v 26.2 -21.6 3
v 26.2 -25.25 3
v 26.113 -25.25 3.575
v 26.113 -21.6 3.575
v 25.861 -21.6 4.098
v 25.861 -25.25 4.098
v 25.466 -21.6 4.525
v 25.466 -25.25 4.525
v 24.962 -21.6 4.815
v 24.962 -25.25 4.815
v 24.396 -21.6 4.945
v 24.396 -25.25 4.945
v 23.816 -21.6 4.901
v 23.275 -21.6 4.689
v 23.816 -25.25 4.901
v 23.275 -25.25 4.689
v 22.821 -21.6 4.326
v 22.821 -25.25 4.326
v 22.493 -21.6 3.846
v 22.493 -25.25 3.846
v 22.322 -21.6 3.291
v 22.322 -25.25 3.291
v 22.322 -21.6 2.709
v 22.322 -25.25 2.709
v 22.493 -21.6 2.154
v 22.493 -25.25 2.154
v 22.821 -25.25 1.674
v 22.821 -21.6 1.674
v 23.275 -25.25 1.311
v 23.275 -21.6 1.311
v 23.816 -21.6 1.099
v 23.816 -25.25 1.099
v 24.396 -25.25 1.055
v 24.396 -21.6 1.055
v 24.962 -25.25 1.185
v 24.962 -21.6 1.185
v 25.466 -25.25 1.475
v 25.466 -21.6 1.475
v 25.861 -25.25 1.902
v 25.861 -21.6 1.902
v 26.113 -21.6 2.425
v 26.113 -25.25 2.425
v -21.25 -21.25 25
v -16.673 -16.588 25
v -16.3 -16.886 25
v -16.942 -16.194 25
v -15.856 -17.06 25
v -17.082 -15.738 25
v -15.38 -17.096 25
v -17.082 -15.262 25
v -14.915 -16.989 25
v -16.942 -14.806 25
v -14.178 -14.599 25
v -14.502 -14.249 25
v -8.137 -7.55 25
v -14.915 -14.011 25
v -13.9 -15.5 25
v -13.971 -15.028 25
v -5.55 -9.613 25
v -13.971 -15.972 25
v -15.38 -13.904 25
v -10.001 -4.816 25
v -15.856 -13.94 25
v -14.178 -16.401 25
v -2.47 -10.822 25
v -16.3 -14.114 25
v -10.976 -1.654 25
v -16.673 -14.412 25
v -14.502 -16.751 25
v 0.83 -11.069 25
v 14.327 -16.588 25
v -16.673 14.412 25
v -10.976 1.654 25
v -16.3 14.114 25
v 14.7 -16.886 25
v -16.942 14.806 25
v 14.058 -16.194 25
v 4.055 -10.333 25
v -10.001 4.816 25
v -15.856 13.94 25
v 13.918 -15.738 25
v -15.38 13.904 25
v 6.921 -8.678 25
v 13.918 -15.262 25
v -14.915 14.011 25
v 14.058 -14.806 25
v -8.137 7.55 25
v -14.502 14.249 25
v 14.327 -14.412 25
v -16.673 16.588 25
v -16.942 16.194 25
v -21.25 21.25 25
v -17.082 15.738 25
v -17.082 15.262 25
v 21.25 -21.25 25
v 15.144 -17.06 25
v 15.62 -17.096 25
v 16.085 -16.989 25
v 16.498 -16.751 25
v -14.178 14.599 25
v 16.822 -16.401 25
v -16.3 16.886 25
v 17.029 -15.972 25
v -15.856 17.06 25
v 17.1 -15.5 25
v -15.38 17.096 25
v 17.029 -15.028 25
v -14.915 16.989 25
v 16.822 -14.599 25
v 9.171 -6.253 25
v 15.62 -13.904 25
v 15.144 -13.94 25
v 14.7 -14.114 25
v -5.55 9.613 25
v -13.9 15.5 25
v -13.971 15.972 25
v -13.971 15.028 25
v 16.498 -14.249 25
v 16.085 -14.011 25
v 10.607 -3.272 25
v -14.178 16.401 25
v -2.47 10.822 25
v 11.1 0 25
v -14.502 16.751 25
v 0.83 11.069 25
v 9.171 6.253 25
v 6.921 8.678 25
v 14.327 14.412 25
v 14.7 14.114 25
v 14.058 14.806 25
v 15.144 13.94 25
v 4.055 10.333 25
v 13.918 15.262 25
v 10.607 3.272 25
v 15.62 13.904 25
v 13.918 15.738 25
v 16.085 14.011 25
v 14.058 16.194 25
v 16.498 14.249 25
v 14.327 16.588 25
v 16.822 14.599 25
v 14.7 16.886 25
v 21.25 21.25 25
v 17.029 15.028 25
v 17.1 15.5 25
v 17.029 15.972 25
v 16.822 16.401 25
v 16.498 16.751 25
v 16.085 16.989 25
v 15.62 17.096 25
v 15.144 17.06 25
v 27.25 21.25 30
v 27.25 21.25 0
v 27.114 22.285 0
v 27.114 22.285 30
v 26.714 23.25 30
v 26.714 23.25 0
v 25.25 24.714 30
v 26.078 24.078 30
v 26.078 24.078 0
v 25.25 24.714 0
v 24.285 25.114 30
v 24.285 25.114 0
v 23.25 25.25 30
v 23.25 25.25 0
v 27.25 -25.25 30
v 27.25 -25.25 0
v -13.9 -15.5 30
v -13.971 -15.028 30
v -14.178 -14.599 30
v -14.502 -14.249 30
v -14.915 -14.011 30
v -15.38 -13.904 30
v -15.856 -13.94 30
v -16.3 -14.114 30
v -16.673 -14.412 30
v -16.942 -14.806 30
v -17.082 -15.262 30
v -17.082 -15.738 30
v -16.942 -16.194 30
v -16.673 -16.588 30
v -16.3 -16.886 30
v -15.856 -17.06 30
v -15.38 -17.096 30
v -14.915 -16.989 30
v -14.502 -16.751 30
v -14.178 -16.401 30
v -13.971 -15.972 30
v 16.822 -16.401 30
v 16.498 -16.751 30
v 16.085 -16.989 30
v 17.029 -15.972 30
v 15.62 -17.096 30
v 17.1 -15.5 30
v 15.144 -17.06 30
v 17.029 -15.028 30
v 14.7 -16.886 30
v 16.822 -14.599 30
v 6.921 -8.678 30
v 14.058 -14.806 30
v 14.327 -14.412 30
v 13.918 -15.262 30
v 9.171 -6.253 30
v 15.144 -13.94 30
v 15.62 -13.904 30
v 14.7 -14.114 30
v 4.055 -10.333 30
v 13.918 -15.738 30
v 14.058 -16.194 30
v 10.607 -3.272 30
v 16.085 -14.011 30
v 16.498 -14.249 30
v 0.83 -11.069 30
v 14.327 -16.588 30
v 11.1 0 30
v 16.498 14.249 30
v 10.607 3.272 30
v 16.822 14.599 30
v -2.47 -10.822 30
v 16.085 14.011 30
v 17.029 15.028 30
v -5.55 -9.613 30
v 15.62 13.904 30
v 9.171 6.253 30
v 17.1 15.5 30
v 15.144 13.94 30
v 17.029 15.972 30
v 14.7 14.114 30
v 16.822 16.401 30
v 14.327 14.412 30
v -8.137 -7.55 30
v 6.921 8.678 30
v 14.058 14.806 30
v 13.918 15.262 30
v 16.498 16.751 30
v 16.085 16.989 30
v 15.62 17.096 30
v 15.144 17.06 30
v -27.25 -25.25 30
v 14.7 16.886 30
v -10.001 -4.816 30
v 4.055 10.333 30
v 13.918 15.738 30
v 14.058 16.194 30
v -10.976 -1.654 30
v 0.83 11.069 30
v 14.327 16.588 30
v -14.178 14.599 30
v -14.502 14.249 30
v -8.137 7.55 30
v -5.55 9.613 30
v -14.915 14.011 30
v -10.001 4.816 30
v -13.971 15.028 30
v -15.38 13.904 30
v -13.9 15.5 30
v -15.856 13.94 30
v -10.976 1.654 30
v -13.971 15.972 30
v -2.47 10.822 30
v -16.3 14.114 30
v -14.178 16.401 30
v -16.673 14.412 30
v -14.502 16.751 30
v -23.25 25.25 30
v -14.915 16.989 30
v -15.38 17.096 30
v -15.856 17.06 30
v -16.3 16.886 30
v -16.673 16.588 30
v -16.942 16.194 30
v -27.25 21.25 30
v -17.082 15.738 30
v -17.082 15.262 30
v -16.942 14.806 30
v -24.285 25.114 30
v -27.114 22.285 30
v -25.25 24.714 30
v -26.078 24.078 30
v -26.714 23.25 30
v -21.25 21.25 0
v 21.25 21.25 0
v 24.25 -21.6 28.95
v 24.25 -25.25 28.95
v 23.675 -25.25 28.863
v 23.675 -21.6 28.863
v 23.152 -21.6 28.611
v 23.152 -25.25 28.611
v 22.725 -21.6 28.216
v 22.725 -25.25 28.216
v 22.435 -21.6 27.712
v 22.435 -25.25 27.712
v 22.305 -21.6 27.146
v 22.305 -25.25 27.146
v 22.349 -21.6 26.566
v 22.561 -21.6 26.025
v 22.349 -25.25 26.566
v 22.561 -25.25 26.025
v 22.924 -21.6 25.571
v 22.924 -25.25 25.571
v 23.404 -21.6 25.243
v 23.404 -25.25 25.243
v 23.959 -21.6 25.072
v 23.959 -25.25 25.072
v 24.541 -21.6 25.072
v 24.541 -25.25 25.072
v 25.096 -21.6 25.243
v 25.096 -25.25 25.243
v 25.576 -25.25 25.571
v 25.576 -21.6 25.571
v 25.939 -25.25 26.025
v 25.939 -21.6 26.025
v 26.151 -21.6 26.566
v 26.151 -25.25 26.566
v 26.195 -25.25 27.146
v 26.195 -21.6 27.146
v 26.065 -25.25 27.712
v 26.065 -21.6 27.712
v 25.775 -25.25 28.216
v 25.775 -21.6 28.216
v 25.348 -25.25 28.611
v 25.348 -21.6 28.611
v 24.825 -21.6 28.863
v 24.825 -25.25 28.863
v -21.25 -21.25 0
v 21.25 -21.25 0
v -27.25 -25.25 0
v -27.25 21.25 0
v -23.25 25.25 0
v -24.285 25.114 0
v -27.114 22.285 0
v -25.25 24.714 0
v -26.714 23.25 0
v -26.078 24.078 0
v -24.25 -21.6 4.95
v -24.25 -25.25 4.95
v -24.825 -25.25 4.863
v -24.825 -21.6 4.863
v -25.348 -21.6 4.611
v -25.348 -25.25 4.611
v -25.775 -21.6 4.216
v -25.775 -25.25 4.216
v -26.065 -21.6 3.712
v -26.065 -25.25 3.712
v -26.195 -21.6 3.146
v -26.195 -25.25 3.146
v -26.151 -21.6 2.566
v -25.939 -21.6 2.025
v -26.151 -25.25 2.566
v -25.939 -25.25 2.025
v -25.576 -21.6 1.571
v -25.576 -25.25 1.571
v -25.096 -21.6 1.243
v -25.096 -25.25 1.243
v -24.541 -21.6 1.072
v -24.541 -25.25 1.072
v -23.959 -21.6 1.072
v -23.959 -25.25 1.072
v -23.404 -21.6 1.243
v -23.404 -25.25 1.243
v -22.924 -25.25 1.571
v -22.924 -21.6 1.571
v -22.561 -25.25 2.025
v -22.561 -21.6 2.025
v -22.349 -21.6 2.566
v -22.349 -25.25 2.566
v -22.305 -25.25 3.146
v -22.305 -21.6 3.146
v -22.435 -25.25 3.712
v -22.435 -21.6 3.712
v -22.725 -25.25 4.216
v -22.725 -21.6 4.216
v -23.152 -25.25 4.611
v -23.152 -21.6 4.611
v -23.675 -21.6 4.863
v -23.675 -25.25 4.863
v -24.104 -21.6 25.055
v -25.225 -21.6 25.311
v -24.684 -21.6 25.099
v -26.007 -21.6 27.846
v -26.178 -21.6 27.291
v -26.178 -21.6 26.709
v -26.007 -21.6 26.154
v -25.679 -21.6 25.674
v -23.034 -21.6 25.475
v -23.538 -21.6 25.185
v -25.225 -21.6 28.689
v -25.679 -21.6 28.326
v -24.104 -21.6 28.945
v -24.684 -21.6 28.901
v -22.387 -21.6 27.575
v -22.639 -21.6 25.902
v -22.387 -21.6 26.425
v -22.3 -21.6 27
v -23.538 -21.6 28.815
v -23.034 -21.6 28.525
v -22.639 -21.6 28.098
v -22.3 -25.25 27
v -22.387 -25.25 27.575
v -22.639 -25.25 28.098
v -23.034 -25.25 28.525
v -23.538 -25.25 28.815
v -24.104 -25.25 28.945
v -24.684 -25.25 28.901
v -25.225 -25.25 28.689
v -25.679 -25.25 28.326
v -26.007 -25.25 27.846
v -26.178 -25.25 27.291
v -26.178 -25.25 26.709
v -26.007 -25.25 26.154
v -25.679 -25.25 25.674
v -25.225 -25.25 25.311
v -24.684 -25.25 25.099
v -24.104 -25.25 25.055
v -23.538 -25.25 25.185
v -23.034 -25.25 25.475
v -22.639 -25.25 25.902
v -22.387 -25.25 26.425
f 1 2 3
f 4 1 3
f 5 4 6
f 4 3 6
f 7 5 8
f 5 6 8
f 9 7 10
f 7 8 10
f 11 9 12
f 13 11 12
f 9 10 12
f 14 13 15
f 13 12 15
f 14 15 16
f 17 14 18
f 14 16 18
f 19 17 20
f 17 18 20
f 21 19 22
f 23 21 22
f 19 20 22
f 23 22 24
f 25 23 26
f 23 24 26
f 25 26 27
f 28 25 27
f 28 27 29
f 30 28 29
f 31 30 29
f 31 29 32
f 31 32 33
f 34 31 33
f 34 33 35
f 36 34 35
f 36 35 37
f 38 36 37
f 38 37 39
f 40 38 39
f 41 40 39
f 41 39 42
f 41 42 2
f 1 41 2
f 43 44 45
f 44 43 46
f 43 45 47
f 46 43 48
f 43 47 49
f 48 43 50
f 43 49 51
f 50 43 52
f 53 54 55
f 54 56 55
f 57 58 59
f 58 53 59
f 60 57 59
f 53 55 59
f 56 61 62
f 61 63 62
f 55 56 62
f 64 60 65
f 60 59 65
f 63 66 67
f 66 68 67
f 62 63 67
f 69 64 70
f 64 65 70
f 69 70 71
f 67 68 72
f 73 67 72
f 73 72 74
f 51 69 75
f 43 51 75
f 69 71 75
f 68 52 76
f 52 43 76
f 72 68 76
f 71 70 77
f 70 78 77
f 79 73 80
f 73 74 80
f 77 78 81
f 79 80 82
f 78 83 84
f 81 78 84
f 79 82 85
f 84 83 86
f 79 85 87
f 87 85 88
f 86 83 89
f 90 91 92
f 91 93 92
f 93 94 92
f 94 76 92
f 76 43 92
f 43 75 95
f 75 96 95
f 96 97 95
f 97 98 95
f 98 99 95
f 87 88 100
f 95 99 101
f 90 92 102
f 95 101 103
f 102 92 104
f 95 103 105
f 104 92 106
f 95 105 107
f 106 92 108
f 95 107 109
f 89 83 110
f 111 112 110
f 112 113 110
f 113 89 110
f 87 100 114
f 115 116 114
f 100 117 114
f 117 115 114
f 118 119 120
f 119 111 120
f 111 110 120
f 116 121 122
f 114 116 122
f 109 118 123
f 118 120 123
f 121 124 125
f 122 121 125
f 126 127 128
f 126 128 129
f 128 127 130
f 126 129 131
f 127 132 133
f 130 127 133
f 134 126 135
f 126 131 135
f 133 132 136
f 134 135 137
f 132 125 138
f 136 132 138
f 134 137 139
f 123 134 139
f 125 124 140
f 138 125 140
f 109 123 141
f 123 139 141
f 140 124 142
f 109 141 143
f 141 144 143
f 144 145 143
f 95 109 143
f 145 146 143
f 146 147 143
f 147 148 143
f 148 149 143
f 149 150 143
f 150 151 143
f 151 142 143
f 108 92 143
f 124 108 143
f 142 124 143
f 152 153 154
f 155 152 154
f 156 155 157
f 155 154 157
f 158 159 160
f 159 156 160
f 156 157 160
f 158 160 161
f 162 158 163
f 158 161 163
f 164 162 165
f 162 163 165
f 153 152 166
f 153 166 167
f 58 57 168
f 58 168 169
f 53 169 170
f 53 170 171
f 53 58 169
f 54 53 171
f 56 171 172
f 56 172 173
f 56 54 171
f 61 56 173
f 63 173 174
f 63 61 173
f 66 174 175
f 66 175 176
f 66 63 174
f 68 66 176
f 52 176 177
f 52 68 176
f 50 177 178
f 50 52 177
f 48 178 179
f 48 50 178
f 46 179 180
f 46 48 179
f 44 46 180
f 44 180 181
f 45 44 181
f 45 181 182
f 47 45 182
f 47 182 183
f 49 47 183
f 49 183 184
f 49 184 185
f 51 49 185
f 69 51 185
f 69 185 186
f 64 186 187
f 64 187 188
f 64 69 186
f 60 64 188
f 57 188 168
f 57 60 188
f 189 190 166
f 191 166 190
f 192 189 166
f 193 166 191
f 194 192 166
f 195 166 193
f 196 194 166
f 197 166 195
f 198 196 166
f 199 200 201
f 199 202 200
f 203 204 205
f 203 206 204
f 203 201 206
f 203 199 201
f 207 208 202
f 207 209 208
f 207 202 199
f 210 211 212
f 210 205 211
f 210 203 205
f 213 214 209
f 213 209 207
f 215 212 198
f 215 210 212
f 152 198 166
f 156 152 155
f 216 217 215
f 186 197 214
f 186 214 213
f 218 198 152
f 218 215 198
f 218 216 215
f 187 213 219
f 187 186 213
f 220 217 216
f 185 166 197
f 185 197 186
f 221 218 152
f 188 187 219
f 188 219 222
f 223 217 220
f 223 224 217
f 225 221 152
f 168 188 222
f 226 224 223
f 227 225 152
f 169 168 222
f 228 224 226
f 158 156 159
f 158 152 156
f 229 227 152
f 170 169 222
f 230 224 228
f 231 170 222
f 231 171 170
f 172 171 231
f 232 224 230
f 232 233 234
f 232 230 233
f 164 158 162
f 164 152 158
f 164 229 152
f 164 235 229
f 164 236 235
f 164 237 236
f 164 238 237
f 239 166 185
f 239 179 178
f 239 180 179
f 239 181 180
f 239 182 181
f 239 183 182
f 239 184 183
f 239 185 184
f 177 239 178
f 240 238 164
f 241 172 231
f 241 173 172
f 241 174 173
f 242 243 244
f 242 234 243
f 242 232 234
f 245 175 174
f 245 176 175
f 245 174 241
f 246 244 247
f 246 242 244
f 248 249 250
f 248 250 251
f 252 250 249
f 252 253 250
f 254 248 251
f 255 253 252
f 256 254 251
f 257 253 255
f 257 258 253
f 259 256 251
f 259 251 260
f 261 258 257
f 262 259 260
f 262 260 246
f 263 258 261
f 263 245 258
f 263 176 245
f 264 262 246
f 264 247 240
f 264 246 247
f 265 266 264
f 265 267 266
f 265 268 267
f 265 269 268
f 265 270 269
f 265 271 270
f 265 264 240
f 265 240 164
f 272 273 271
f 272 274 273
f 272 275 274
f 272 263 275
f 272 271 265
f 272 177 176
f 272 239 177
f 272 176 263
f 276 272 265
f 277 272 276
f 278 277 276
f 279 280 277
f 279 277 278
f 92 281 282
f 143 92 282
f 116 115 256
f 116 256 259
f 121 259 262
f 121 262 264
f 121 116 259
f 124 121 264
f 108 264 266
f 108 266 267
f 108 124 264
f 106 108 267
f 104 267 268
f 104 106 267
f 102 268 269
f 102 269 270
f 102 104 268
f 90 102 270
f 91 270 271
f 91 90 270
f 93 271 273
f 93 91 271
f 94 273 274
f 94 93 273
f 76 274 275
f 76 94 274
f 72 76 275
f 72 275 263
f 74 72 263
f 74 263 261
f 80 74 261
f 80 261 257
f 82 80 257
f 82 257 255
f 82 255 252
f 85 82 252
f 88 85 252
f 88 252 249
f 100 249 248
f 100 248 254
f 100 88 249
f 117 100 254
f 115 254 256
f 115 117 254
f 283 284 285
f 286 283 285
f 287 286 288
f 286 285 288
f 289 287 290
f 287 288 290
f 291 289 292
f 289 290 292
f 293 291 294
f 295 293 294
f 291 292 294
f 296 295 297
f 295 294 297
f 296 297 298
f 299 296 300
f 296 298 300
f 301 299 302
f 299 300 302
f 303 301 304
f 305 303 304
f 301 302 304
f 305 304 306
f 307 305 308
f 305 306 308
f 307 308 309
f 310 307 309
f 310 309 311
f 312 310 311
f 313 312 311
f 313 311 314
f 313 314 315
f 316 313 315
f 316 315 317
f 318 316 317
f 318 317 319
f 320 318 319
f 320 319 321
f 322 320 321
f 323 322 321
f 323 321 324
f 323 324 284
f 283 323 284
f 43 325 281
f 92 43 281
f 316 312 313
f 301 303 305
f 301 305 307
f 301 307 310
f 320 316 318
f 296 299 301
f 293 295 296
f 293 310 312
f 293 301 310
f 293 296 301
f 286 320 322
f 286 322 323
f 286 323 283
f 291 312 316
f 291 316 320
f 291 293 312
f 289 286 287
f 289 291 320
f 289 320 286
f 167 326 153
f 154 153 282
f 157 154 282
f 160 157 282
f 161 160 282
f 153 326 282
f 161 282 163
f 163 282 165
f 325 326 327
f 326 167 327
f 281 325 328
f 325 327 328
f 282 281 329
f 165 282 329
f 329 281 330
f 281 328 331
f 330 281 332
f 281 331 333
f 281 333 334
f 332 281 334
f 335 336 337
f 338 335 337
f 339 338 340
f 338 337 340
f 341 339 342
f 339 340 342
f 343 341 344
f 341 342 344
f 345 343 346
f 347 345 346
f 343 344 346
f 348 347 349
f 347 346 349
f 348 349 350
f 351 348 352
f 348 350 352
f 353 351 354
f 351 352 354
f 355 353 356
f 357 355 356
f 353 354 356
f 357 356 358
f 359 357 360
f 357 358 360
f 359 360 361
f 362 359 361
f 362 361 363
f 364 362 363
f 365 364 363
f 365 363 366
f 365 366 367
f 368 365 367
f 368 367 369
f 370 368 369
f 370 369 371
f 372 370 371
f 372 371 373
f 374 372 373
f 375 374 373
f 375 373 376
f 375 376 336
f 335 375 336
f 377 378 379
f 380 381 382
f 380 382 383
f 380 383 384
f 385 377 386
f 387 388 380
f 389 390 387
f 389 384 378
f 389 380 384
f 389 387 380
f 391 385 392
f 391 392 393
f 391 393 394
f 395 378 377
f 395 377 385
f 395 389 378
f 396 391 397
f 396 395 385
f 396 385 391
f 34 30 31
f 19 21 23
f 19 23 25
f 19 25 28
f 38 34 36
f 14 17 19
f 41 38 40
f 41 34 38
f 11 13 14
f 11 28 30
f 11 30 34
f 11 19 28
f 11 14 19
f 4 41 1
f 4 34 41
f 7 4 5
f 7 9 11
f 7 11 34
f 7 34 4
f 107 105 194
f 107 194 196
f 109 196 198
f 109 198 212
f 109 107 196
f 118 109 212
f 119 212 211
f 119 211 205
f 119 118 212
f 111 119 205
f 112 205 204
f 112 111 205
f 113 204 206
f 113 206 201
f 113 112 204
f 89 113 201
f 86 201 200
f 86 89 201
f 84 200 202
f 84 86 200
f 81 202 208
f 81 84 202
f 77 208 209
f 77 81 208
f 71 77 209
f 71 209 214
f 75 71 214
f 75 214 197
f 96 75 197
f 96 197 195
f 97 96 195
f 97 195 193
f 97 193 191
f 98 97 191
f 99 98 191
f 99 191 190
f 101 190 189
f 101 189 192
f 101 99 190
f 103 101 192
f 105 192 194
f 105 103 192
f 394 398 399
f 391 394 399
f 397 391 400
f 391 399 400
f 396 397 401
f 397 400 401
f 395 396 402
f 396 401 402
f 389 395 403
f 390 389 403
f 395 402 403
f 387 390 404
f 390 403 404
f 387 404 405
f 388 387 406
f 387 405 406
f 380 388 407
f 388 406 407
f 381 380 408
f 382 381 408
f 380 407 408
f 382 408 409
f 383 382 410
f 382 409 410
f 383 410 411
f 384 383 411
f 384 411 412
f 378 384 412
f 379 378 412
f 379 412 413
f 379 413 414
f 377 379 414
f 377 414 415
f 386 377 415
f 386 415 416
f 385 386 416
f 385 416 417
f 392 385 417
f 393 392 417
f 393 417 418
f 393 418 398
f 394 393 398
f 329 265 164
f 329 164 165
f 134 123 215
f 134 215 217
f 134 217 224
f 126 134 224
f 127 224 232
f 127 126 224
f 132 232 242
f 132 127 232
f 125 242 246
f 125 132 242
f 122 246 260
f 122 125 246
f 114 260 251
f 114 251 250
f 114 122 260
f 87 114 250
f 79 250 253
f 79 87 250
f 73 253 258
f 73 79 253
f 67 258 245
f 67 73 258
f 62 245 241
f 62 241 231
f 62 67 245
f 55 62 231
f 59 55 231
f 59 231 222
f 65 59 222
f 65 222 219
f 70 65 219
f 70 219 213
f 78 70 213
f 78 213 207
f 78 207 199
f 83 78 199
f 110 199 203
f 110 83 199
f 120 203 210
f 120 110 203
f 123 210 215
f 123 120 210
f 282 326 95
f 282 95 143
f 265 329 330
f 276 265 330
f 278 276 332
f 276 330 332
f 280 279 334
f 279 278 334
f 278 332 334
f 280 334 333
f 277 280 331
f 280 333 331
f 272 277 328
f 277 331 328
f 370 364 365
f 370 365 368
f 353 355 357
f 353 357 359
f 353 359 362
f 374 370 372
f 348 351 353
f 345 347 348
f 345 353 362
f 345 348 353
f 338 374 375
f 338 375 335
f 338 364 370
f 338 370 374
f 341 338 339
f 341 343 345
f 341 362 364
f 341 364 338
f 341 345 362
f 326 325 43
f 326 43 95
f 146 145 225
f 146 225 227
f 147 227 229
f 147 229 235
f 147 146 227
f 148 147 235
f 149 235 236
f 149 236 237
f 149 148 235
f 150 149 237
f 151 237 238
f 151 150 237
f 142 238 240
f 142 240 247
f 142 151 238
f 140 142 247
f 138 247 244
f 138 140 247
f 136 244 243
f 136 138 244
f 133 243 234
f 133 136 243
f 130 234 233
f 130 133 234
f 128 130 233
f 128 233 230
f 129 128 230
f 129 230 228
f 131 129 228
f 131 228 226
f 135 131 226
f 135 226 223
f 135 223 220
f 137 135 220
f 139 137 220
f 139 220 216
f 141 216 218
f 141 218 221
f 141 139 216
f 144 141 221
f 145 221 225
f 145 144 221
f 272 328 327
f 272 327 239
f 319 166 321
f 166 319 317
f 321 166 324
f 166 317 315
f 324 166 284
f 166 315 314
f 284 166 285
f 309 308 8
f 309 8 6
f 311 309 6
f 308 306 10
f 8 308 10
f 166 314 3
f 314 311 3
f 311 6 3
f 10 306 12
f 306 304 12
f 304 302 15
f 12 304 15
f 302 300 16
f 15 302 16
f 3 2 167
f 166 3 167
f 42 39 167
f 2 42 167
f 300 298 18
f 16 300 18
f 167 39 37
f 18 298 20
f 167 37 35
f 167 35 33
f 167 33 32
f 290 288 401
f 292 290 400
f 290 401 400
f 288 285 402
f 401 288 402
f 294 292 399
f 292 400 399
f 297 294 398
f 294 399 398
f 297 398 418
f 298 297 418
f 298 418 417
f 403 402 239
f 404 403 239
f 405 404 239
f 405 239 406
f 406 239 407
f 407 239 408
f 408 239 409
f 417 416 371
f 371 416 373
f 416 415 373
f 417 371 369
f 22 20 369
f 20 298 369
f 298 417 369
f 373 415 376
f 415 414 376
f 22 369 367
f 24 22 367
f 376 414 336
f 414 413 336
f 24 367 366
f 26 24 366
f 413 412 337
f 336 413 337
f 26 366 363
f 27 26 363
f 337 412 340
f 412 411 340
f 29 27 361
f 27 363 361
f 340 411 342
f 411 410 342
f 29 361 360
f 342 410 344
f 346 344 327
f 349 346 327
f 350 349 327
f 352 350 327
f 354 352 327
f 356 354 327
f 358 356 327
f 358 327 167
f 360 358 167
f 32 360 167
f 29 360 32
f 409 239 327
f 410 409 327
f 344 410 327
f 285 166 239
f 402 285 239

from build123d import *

# Parameters (mm, degrees)
SKETCH1_W           = 50.5
SKETCH1_H           = 50.5
SKETCH1_W_2         = 42.5
SKETCH1_H_2         = 42.5
BOSS_EXTRUDE1_DEPTH = 25
SKETCH3_W           = 50.5
SKETCH3_H           = 50.5
SKETCH3_R           = 11.1
SKETCH3_R_2         = 1.6
BOSS_EXTRUDE2_DEPTH = 5
SKETCH6_W           = 30
SKETCH6_H           = 50.5
BOSS_EXTRUDE3_DEPTH = 2
SKETCH7_W           = 30
SKETCH7_H           = 50.5
BOSS_EXTRUDE4_DEPTH = 2
SKETCH5_R           = 1.95
CUT_EXTRUDE1_DEPTH  = 5.7
CUT_EXTRUDE2_DEPTH  = 48.750654446


with BuildPart() as part:
    # Sketch1 → Boss-Extrude1 (new body)
    with BuildSketch(Plane.XY):
        Rectangle(SKETCH1_W, SKETCH1_H)
        Rectangle(SKETCH1_W_2, SKETCH1_H_2, mode=Mode.SUBTRACT)
    extrude(amount=BOSS_EXTRUDE1_DEPTH)

    # Sketch3 → Boss-Extrude2 (add)
    with BuildSketch(Plane.XY.offset(25)):
        Rectangle(SKETCH3_W, SKETCH3_H)
        Circle(SKETCH3_R, mode=Mode.SUBTRACT)
        with Locations((-15.5, 15.5)):
            Circle(SKETCH3_R_2, mode=Mode.SUBTRACT)
        with Locations((15.5, 15.5)):
            Circle(SKETCH3_R_2, mode=Mode.SUBTRACT)
        with Locations((15.5, -15.5)):
            Circle(SKETCH3_R_2, mode=Mode.SUBTRACT)
        with Locations((-15.5, -15.5)):
            Circle(SKETCH3_R_2, mode=Mode.SUBTRACT)
    extrude(amount=BOSS_EXTRUDE2_DEPTH)

    # Sketch6 → Boss-Extrude3 (add)
    with BuildSketch(Plane.ZY.offset(25.25)):
        with Locations((15, 0)):
            Rectangle(SKETCH6_W, SKETCH6_H)
    extrude(amount=BOSS_EXTRUDE3_DEPTH)

    # Sketch7 → Boss-Extrude4 (add)
    with BuildSketch(Plane(origin=(25.25, 0, 0), x_dir=(0, 0, -1), z_dir=(1, 0, 0))):
        with Locations((-15, 0)):
            Rectangle(SKETCH7_W, SKETCH7_H)
    extrude(amount=BOSS_EXTRUDE4_DEPTH)

    # Sketch5 → Cut-Extrude1 (cut)
    with BuildSketch(Plane(origin=(0, -27.3, 0), x_dir=(-1, 0, 0), z_dir=(0, -1, 0))):
        with Locations(Location((-24.25, -3, 0), (0, 0, 180))):
            Circle(SKETCH5_R)
        with Locations(Location((24.25, -3, 0), (0, 0, 270))):
            Circle(SKETCH5_R)
        with Locations(Location((24.25, -27, 0), (0, 0, 180))):
            Circle(SKETCH5_R)
        with Locations(Location((-24.25, -27, 0), (0, 0, 270))):
            Circle(SKETCH5_R)
    extrude(amount=-CUT_EXTRUDE1_DEPTH, mode=Mode.SUBTRACT)

    # Sketch8 → Cut-Extrude2 (cut, through all)
    with BuildSketch(Plane(origin=(0, 0, 0), x_dir=(-1, 0, 0), z_dir=(0, 0, -1))):
        with BuildLine():
            Line((27.25, 25.25), (23.25, 25.25))
            ThreePointArc((23.25, 25.25), (26.078427125, 24.078427125), (27.25, 21.25))
            Line((27.25, 21.25), (27.25, 25.25))
        make_face()
        with BuildLine():
            ThreePointArc((-27.25, 21.25), (-26.078427125, 24.078427125), (-23.25, 25.25))
            Line((-23.25, 25.25), (-27.25, 25.25))
            Line((-27.25, 25.25), (-27.25, 21.25))
        make_face()
    extrude(amount=-CUT_EXTRUDE2_DEPTH, mode=Mode.SUBTRACT)


solid = part.part
